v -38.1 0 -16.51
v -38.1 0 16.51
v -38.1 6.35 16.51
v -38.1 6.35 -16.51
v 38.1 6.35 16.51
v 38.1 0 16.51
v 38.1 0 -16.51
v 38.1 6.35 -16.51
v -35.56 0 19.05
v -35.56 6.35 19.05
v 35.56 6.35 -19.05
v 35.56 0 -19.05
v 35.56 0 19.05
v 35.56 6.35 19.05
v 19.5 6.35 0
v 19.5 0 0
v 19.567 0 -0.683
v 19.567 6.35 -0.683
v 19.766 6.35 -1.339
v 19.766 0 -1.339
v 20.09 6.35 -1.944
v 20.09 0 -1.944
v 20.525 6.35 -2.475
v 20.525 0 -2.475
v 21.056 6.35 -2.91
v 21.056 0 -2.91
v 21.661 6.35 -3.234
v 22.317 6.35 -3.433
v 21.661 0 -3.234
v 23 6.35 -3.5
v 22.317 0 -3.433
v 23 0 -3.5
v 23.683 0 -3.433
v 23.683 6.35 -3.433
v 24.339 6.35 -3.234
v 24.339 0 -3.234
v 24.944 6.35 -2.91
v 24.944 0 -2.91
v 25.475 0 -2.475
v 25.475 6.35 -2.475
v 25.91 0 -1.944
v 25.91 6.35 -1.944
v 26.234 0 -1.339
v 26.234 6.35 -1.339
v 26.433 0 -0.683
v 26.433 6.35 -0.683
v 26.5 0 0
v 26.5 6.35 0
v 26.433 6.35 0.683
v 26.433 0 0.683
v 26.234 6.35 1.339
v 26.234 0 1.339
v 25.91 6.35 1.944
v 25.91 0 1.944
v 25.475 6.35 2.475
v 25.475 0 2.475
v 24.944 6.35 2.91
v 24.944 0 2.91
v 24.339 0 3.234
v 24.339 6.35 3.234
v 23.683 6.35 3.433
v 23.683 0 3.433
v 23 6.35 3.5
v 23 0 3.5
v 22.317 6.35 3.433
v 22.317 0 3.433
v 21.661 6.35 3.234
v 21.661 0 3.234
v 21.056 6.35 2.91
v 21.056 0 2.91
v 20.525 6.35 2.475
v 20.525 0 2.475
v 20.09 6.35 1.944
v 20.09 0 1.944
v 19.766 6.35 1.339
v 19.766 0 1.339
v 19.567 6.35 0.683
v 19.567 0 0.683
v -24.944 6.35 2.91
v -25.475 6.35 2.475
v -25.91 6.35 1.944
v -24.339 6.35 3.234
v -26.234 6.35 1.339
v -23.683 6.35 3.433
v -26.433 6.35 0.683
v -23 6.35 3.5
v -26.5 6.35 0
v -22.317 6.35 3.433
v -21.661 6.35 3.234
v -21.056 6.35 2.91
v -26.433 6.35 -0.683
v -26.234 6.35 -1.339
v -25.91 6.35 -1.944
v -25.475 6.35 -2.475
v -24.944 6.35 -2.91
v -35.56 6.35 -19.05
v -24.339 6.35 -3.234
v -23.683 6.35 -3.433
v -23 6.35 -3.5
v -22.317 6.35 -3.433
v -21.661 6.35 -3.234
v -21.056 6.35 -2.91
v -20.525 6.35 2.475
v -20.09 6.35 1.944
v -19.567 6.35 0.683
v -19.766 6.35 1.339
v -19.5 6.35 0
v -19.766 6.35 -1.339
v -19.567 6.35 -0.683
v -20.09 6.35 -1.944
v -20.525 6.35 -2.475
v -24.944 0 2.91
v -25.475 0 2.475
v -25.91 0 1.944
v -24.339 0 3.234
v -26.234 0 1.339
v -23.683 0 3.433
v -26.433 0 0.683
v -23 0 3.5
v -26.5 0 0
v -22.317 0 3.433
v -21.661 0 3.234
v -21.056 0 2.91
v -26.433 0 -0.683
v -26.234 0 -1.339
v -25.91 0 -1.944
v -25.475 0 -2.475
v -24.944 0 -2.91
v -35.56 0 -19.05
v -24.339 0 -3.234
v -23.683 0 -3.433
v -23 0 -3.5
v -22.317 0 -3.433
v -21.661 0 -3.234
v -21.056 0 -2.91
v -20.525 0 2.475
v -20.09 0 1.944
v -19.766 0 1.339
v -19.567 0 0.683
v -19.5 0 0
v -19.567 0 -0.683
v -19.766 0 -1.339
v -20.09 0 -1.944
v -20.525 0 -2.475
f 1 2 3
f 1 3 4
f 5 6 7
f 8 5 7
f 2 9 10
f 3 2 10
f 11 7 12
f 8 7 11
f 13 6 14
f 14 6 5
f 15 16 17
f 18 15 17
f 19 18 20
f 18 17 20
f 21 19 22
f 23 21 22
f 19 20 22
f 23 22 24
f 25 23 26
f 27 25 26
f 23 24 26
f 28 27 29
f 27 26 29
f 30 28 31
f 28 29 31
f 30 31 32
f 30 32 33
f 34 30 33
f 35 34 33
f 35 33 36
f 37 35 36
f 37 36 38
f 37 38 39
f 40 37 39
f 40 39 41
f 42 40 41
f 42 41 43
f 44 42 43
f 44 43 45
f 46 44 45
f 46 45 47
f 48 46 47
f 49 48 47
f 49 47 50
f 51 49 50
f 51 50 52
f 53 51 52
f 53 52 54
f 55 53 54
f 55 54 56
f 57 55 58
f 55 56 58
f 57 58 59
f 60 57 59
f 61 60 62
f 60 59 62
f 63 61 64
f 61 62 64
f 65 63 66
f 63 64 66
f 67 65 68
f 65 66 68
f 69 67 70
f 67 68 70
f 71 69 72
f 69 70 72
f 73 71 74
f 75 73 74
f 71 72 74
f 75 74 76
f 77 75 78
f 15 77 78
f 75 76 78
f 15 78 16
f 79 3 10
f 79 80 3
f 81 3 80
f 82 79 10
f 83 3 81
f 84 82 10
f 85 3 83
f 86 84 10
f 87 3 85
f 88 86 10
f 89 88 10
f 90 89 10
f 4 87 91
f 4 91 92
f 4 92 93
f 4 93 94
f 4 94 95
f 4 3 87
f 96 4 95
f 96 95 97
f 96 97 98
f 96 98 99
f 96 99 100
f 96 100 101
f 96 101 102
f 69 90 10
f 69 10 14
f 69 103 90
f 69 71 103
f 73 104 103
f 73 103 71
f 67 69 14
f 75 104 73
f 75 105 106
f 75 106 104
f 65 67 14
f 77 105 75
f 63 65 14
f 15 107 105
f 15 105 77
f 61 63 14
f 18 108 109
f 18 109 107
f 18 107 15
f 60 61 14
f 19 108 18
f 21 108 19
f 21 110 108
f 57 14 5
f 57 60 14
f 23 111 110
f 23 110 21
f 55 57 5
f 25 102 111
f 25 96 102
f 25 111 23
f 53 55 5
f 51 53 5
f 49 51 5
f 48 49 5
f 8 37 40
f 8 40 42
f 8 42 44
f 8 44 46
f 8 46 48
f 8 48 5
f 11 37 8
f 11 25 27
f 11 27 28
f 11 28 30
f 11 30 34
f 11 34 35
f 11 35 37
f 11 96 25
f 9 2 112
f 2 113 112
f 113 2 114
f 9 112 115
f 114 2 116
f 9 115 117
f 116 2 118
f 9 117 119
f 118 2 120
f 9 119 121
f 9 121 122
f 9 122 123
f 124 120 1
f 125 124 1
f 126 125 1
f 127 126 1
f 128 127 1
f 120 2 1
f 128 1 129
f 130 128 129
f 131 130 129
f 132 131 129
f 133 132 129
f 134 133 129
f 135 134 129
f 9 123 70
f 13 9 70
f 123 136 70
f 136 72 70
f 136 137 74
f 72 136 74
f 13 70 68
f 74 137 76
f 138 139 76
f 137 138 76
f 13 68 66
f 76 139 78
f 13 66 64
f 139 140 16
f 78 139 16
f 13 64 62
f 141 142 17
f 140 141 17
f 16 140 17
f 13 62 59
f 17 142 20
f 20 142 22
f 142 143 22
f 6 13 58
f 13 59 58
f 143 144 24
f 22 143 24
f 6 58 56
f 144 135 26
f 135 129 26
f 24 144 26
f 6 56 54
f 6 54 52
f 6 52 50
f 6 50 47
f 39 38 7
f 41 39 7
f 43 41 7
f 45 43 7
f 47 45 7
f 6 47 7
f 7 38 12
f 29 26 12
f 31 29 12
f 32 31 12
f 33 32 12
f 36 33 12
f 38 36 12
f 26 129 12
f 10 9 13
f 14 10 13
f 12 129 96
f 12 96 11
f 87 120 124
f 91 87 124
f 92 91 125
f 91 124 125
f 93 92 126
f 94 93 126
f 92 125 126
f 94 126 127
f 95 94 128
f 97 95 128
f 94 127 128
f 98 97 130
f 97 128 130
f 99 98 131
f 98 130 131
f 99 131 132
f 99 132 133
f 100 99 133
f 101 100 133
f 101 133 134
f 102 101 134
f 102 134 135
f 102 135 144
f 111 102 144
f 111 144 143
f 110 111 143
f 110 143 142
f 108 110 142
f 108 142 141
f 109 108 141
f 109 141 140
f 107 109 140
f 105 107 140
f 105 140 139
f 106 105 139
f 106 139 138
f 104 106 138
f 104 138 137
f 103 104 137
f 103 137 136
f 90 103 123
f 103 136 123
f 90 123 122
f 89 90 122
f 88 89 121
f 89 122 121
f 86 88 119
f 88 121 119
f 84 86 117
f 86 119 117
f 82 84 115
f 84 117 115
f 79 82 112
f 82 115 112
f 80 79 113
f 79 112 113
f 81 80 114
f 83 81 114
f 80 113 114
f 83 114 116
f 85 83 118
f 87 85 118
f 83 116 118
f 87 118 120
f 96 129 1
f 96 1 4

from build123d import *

# Parameters (mm, degrees)
SKETCH1_W            = 76.2
SKETCH1_H            = 38.1
BOSS_EXTRUDE1_DEPTH  = 6.35
M6_CLEARANCE_HOLE1_D = 7
CHAMFER1_SIZE        = 2.54


with BuildPart() as part:
    # Sketch1 → Boss-Extrude1 (new body)
    with BuildSketch(Plane(origin=(0, 0, 0), x_dir=(1, 0, 0), z_dir=(0, 1, 0))):
        Rectangle(SKETCH1_W, SKETCH1_H)
    extrude(amount=BOSS_EXTRUDE1_DEPTH)

    # M6 Clearance Hole1 (through all)
    with Locations(Plane(origin=(0, 6.35, 0), x_dir=(1, 0, 0), z_dir=(0, 1, 0))):
        with Locations((-22.999999974, 0), (22.999999974, 0)):
            Hole(M6_CLEARANCE_HOLE1_D / 2)

    # Chamfer1
    chamfer1_edges = [part.edges().sort_by_distance(p)[0] for p in [
        (38.1, 3.175, 19.05),
        (-38.1, 3.175, 19.05),
        (-38.1, 3.175, -19.05),
        (38.1, 3.175, -19.05),
    ]]
    chamfer(chamfer1_edges, length=CHAMFER1_SIZE)


solid = part.part
